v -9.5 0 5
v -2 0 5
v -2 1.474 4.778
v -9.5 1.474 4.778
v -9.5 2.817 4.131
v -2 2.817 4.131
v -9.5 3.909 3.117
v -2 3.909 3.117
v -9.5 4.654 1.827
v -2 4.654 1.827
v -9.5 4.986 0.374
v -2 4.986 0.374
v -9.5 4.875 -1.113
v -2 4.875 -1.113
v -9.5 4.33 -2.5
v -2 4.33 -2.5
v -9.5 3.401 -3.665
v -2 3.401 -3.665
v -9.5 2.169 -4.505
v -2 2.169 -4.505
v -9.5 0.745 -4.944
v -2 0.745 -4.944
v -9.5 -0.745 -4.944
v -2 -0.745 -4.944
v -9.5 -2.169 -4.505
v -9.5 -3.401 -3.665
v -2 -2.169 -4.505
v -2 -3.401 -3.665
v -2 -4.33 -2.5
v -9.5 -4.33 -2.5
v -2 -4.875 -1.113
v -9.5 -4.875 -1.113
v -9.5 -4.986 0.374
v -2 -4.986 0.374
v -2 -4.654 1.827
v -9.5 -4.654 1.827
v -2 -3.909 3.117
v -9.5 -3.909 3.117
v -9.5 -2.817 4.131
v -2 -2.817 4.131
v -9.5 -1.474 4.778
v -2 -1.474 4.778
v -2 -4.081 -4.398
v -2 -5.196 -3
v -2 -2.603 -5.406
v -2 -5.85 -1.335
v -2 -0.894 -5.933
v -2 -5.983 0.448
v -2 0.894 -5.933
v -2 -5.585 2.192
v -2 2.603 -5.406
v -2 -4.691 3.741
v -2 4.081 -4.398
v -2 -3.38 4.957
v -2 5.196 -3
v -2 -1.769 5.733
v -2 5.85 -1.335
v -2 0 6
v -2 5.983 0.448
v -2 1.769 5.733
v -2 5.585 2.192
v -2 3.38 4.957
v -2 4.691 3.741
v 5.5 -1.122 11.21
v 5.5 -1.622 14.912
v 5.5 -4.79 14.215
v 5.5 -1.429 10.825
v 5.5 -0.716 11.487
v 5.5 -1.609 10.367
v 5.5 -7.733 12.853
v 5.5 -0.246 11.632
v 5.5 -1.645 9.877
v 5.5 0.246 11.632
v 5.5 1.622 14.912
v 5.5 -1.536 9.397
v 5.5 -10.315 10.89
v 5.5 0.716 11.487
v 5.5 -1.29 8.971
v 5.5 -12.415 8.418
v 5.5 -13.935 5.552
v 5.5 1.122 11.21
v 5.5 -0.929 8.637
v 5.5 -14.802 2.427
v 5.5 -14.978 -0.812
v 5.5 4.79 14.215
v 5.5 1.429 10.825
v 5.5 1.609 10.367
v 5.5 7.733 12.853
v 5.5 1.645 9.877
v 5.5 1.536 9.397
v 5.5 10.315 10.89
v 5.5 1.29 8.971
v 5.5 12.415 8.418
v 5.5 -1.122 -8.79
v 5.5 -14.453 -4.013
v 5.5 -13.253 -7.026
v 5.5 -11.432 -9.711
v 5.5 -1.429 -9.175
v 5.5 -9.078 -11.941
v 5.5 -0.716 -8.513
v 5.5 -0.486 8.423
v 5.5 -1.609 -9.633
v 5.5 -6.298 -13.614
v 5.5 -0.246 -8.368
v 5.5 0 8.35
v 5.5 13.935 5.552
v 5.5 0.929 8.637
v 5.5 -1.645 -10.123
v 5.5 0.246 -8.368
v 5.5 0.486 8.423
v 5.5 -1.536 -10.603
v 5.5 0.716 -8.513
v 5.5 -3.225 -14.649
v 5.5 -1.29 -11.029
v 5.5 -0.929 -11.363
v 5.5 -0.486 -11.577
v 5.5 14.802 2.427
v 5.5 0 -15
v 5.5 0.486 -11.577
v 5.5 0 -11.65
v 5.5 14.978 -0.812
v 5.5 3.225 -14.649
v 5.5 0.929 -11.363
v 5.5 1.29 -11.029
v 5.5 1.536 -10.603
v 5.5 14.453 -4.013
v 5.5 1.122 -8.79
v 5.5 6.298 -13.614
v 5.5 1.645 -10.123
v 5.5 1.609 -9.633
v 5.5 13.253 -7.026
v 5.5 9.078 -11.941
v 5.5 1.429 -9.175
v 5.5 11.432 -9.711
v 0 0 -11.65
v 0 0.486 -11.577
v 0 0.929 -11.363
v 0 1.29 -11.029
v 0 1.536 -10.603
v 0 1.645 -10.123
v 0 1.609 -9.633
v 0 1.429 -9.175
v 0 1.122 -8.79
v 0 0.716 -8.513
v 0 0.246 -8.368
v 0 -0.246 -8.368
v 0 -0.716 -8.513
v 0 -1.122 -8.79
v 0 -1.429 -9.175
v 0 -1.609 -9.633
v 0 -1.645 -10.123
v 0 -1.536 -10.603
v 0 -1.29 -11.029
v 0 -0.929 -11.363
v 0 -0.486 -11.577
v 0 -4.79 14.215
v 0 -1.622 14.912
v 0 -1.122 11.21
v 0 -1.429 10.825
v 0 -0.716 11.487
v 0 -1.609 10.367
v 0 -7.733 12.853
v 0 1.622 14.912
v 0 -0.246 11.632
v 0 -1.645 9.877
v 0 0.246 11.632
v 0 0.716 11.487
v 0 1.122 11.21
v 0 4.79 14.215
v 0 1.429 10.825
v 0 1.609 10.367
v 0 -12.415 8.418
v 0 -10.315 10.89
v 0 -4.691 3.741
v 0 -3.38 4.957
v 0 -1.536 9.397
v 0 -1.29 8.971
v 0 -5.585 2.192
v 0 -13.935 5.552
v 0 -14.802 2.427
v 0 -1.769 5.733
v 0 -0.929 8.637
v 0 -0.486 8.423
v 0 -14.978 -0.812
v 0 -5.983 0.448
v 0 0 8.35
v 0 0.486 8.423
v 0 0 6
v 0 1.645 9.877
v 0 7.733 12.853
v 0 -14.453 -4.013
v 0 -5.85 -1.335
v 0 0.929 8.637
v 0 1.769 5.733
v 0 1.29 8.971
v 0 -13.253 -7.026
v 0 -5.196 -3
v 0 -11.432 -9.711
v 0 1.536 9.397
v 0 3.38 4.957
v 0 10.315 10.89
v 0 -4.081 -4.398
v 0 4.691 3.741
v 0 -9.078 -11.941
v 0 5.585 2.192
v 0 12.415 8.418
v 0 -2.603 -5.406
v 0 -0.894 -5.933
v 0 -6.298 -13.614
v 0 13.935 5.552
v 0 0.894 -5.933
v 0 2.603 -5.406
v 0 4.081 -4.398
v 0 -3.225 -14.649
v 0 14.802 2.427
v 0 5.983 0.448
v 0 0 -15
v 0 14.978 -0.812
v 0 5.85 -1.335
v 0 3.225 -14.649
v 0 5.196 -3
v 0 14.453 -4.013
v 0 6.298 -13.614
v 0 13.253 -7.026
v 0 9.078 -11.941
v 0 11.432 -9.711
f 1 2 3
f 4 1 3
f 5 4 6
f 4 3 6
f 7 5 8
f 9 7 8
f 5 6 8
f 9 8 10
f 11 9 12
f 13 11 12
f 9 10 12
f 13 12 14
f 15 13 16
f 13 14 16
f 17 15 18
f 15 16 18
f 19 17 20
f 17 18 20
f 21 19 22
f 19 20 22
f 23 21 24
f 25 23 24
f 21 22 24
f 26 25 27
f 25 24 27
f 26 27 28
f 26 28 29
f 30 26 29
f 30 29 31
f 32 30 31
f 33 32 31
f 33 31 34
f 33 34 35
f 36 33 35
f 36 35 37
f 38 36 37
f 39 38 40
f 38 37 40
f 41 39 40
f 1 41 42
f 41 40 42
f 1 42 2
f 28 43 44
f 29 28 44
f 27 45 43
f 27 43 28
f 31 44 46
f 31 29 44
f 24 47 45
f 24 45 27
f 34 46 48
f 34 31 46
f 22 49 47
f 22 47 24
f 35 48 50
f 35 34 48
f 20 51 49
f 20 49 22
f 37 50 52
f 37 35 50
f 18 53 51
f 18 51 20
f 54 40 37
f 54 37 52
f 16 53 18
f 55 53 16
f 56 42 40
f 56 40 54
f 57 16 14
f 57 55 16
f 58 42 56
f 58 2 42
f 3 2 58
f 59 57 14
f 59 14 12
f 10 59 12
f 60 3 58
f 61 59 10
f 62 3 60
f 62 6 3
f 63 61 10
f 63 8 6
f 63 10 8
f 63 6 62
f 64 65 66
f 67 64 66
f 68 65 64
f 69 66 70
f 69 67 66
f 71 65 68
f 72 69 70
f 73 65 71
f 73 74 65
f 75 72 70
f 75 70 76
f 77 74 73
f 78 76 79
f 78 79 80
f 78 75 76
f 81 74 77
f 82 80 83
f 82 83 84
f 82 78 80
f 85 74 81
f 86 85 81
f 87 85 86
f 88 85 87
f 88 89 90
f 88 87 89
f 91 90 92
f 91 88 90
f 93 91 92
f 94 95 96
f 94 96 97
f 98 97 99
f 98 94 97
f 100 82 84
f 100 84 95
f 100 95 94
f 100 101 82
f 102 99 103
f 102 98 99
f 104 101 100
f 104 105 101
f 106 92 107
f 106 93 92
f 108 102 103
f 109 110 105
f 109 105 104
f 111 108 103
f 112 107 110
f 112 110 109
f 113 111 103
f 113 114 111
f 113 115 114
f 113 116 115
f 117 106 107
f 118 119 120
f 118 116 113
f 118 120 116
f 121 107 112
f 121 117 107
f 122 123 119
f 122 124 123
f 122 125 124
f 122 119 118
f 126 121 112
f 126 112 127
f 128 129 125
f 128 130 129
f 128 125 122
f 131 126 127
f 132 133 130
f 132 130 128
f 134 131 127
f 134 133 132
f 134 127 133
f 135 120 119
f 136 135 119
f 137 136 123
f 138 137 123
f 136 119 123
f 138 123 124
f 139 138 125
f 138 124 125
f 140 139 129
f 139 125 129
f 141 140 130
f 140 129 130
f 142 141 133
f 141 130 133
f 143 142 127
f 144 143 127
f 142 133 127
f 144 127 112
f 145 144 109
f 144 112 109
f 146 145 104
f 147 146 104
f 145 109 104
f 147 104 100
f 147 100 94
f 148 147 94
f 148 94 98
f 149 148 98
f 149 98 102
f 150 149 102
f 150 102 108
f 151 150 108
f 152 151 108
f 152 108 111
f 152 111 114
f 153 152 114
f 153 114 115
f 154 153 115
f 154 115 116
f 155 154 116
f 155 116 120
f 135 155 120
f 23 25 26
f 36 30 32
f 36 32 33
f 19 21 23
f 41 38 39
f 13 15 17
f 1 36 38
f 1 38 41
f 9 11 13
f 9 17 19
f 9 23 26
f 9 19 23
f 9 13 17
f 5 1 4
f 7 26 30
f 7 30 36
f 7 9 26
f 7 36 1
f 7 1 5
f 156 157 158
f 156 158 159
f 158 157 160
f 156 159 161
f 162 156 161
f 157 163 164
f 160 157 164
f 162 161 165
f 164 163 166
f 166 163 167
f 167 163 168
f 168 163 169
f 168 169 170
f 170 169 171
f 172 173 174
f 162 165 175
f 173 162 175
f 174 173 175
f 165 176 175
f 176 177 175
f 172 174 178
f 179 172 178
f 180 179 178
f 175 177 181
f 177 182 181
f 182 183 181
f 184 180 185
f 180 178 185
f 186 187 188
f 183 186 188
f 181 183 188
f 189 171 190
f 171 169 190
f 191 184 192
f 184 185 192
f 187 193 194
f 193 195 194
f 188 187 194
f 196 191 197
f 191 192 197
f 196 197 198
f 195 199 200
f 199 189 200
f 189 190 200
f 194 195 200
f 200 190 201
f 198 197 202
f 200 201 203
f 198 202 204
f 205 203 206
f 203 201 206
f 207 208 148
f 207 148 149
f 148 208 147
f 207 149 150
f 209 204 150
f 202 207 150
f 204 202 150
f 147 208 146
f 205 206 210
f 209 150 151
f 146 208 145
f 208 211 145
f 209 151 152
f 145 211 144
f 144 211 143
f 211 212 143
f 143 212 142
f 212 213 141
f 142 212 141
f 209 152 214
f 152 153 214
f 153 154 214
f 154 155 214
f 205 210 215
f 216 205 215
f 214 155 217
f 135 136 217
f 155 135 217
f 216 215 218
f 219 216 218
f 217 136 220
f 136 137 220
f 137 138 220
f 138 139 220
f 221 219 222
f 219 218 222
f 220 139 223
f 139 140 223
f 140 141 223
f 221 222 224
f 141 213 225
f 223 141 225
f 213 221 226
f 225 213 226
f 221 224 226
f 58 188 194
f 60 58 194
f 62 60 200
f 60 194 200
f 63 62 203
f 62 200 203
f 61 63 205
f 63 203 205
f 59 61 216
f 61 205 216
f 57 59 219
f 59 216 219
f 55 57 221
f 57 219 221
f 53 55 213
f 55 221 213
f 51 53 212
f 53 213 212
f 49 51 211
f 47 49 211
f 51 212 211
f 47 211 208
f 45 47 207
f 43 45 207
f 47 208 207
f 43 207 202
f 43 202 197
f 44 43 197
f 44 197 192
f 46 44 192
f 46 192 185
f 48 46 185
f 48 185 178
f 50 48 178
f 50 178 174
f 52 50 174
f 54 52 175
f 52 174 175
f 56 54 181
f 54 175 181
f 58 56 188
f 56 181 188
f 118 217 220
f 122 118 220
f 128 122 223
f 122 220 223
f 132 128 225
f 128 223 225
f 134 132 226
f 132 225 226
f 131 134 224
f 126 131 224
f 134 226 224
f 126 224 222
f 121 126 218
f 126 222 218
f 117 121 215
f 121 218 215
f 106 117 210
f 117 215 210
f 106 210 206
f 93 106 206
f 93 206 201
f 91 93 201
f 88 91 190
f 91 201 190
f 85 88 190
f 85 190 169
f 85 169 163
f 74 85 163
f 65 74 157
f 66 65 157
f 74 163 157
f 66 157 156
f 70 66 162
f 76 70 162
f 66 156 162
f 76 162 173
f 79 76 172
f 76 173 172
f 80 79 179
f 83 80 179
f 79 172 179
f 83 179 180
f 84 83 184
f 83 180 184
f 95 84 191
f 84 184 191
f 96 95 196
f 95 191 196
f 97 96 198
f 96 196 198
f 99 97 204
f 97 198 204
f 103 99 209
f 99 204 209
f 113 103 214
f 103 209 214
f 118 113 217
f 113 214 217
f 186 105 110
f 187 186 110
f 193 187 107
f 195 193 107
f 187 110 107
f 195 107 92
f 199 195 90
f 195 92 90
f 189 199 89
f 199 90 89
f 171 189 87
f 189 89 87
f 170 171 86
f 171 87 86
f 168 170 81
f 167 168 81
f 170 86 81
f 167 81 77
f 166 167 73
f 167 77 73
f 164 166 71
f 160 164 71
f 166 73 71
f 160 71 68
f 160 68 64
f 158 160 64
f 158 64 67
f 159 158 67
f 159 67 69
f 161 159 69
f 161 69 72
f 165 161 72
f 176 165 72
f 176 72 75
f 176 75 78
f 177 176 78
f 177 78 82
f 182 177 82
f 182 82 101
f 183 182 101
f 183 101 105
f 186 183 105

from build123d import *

# Parameters (mm, degrees)
SKETCH_1_R          = 15
EXTRUDE_1_DEPTH     = 5.5
SKETCH_2_R          = 6
EXTRUDE_2_DEPTH     = 2
SKETCH_3_R          = 5
EXTRUDE_3_DEPTH     = 7.5
SKETCH_4_R          = 1.65
CUT_EXTRUDE_1_DEPTH = 26.980762114


with BuildPart() as part:
    # ｽｹｯﾁ1 → ﾎﾞｽ - 押し出し1 (new body)
    with BuildSketch(Plane(origin=(0, 0, 0), x_dir=(0, 0, -1), z_dir=(1, 0, 0))):
        Circle(SKETCH_1_R)
    extrude(amount=EXTRUDE_1_DEPTH)

    # ｽｹｯﾁ2 → ﾎﾞｽ - 押し出し2 (add)
    with BuildSketch(Plane.ZY):
        Circle(SKETCH_2_R)
    extrude(amount=EXTRUDE_2_DEPTH)

    # ｽｹｯﾁ3 → ﾎﾞｽ - 押し出し3 (add)
    with BuildSketch(Plane.ZY.offset(2)):
        Circle(SKETCH_3_R)
    extrude(amount=EXTRUDE_3_DEPTH)

    # ｽｹｯﾁ4 → ｶｯﾄ - 押し出し1 (cut, through all)
    with BuildSketch(Plane(origin=(5.5, 0, 0), x_dir=(0, 0, -1), z_dir=(1, 0, 0))):
        with Locations((10, 0)):
            Circle(SKETCH_4_R)
        with Locations((-10, 0)):
            Circle(SKETCH_4_R)
    extrude(amount=-CUT_EXTRUDE_1_DEPTH, mode=Mode.SUBTRACT)


solid = part.part
